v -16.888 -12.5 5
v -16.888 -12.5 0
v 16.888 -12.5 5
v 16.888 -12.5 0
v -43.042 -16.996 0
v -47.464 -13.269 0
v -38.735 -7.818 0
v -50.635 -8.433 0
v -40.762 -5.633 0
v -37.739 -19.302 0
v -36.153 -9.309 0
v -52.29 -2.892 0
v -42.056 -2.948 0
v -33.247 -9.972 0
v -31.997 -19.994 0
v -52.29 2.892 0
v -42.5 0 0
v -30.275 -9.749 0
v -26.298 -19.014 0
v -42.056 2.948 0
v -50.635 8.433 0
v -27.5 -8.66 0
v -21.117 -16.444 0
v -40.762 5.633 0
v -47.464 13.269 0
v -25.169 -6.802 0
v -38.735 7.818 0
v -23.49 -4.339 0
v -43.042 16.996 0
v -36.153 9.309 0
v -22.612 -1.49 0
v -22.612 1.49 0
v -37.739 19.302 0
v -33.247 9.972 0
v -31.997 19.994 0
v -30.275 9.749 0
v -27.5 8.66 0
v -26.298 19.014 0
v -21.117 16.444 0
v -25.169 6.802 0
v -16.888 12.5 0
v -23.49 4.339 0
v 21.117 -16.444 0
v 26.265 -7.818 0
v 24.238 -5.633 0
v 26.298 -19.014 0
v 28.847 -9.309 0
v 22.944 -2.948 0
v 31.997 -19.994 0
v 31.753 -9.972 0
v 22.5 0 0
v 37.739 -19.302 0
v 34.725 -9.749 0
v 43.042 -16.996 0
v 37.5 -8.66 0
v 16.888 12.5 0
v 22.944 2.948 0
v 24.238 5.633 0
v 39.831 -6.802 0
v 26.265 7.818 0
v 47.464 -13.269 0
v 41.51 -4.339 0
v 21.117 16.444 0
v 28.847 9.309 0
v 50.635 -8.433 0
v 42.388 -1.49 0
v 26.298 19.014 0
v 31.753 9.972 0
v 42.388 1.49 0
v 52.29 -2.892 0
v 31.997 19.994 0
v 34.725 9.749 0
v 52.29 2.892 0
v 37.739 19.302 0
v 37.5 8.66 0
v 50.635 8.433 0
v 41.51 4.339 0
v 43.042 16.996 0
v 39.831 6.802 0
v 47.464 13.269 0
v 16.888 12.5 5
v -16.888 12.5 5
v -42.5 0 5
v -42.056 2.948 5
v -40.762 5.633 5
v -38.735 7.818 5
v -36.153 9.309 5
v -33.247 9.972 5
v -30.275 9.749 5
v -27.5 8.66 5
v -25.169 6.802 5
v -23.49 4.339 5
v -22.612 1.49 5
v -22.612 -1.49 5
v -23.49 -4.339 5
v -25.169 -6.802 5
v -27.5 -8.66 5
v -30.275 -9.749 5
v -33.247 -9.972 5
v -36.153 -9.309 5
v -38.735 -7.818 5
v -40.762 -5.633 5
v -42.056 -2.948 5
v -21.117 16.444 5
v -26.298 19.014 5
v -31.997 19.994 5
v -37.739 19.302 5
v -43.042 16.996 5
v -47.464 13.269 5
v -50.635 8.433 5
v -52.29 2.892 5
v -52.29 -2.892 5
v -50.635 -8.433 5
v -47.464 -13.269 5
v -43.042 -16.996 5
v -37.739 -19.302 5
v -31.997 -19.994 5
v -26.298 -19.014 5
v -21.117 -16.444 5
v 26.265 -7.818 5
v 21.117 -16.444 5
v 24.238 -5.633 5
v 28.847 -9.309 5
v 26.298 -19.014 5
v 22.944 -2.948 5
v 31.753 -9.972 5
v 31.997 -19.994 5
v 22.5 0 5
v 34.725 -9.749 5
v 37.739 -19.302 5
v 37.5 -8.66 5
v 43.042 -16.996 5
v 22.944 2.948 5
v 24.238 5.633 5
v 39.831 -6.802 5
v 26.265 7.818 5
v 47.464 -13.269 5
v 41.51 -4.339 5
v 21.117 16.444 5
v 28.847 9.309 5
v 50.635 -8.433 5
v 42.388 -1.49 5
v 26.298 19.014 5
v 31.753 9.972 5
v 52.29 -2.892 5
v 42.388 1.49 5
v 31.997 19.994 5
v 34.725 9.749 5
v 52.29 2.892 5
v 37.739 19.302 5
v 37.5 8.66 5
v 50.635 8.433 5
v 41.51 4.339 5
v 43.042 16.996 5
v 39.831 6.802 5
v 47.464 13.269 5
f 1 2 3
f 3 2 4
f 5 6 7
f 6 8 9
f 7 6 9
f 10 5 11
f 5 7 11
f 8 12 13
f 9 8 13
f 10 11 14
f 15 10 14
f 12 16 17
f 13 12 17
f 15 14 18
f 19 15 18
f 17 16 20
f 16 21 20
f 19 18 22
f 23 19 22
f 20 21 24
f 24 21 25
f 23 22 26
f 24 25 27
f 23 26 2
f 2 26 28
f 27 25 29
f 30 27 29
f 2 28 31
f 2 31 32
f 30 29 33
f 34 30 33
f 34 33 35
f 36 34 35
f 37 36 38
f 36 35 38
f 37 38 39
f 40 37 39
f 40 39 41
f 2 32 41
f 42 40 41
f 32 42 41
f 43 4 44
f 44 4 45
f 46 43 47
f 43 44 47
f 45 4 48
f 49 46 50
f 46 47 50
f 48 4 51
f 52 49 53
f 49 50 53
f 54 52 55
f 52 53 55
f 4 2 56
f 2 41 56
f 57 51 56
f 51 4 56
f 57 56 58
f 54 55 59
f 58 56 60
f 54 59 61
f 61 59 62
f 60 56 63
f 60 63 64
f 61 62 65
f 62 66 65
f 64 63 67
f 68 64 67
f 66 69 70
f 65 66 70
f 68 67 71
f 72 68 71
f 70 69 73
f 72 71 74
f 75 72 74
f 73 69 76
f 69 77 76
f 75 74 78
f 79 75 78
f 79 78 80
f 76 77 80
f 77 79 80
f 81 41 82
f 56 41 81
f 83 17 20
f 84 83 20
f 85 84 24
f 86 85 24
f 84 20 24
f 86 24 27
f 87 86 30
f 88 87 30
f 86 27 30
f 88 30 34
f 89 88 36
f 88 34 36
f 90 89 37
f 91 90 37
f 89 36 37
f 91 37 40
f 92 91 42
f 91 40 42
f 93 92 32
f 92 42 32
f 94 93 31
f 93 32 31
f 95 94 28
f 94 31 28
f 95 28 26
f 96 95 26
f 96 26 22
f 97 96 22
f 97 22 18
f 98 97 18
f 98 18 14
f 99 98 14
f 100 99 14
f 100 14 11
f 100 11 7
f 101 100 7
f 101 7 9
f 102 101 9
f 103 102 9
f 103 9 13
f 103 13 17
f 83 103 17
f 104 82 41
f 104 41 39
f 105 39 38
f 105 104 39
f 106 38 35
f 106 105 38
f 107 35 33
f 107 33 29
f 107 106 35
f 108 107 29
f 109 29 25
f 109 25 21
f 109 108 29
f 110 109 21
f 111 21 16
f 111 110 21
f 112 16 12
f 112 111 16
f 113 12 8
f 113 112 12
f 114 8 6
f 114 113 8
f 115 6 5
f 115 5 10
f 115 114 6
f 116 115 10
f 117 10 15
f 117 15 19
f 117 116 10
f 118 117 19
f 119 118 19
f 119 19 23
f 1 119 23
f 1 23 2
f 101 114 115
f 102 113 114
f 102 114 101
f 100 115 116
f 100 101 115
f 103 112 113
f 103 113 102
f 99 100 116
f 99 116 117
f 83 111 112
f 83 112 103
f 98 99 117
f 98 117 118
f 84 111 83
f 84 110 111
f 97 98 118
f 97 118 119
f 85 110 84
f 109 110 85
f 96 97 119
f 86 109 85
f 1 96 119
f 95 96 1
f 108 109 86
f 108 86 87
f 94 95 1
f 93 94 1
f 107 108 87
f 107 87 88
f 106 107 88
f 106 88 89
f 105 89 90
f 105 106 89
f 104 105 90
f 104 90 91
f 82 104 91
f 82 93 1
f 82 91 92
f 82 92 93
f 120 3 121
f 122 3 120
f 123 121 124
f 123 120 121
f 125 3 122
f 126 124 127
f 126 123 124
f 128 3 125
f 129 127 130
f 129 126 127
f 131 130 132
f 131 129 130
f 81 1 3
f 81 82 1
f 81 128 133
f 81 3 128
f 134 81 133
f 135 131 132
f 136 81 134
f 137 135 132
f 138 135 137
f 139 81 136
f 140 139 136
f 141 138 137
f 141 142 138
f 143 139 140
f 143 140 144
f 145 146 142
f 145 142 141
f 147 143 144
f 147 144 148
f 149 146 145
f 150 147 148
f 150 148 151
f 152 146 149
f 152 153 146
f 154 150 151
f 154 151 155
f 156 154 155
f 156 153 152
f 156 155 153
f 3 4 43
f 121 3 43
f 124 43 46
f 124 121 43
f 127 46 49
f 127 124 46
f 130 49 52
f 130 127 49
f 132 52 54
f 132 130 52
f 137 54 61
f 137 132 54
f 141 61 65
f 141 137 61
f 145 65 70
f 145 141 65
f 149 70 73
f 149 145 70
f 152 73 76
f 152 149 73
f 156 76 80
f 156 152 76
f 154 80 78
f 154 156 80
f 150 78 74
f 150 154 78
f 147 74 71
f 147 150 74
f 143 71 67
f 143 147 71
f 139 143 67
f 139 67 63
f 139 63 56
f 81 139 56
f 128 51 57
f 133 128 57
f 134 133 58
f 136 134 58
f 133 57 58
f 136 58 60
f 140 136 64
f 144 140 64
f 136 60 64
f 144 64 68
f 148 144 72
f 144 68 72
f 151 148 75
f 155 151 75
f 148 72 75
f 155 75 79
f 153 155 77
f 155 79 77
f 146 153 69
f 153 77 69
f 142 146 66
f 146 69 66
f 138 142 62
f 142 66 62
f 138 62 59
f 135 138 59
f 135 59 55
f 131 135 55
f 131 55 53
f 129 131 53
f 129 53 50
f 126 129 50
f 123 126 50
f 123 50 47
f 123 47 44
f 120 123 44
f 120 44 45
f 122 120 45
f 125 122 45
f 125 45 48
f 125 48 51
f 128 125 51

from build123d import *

# Parameters (mm, degrees)
SKETCH_1_W          = 85
SKETCH_1_H          = 25
EXTRUDE_1_DEPTH     = 5
SKETCH_2_R          = 20
EXTRUDE_2_DEPTH     = 5
SKETCH_3_R          = 10
CUT_EXTRUDE_1_DEPTH = 35


with BuildPart() as part:
    # 草图1 → 凸台-拉伸1 (new body)
    with BuildSketch(Plane.XY):
        Rectangle(SKETCH_1_W, SKETCH_1_H)
    extrude(amount=EXTRUDE_1_DEPTH)

    # 草图2 → 凸台-拉伸2 (add)
    with BuildSketch(Plane.XY.offset(5)):
        with Locations((32.5, 0)):
            Circle(SKETCH_2_R)
        with Locations((-32.5, 0)):
            Circle(SKETCH_2_R)
    extrude(amount=-EXTRUDE_2_DEPTH)

    # 草图3 → 切除-拉伸1 (cut)
    with BuildSketch(Plane(origin=(0, 0, 0), x_dir=(-1, 0, 0), z_dir=(0, 0, -1))):
        with Locations((-32.5, 0)):
            Circle(SKETCH_3_R)
        with Locations((32.5, 0)):
            Circle(SKETCH_3_R)
    extrude(amount=-CUT_EXTRUDE_1_DEPTH, mode=Mode.SUBTRACT)


solid = part.part
